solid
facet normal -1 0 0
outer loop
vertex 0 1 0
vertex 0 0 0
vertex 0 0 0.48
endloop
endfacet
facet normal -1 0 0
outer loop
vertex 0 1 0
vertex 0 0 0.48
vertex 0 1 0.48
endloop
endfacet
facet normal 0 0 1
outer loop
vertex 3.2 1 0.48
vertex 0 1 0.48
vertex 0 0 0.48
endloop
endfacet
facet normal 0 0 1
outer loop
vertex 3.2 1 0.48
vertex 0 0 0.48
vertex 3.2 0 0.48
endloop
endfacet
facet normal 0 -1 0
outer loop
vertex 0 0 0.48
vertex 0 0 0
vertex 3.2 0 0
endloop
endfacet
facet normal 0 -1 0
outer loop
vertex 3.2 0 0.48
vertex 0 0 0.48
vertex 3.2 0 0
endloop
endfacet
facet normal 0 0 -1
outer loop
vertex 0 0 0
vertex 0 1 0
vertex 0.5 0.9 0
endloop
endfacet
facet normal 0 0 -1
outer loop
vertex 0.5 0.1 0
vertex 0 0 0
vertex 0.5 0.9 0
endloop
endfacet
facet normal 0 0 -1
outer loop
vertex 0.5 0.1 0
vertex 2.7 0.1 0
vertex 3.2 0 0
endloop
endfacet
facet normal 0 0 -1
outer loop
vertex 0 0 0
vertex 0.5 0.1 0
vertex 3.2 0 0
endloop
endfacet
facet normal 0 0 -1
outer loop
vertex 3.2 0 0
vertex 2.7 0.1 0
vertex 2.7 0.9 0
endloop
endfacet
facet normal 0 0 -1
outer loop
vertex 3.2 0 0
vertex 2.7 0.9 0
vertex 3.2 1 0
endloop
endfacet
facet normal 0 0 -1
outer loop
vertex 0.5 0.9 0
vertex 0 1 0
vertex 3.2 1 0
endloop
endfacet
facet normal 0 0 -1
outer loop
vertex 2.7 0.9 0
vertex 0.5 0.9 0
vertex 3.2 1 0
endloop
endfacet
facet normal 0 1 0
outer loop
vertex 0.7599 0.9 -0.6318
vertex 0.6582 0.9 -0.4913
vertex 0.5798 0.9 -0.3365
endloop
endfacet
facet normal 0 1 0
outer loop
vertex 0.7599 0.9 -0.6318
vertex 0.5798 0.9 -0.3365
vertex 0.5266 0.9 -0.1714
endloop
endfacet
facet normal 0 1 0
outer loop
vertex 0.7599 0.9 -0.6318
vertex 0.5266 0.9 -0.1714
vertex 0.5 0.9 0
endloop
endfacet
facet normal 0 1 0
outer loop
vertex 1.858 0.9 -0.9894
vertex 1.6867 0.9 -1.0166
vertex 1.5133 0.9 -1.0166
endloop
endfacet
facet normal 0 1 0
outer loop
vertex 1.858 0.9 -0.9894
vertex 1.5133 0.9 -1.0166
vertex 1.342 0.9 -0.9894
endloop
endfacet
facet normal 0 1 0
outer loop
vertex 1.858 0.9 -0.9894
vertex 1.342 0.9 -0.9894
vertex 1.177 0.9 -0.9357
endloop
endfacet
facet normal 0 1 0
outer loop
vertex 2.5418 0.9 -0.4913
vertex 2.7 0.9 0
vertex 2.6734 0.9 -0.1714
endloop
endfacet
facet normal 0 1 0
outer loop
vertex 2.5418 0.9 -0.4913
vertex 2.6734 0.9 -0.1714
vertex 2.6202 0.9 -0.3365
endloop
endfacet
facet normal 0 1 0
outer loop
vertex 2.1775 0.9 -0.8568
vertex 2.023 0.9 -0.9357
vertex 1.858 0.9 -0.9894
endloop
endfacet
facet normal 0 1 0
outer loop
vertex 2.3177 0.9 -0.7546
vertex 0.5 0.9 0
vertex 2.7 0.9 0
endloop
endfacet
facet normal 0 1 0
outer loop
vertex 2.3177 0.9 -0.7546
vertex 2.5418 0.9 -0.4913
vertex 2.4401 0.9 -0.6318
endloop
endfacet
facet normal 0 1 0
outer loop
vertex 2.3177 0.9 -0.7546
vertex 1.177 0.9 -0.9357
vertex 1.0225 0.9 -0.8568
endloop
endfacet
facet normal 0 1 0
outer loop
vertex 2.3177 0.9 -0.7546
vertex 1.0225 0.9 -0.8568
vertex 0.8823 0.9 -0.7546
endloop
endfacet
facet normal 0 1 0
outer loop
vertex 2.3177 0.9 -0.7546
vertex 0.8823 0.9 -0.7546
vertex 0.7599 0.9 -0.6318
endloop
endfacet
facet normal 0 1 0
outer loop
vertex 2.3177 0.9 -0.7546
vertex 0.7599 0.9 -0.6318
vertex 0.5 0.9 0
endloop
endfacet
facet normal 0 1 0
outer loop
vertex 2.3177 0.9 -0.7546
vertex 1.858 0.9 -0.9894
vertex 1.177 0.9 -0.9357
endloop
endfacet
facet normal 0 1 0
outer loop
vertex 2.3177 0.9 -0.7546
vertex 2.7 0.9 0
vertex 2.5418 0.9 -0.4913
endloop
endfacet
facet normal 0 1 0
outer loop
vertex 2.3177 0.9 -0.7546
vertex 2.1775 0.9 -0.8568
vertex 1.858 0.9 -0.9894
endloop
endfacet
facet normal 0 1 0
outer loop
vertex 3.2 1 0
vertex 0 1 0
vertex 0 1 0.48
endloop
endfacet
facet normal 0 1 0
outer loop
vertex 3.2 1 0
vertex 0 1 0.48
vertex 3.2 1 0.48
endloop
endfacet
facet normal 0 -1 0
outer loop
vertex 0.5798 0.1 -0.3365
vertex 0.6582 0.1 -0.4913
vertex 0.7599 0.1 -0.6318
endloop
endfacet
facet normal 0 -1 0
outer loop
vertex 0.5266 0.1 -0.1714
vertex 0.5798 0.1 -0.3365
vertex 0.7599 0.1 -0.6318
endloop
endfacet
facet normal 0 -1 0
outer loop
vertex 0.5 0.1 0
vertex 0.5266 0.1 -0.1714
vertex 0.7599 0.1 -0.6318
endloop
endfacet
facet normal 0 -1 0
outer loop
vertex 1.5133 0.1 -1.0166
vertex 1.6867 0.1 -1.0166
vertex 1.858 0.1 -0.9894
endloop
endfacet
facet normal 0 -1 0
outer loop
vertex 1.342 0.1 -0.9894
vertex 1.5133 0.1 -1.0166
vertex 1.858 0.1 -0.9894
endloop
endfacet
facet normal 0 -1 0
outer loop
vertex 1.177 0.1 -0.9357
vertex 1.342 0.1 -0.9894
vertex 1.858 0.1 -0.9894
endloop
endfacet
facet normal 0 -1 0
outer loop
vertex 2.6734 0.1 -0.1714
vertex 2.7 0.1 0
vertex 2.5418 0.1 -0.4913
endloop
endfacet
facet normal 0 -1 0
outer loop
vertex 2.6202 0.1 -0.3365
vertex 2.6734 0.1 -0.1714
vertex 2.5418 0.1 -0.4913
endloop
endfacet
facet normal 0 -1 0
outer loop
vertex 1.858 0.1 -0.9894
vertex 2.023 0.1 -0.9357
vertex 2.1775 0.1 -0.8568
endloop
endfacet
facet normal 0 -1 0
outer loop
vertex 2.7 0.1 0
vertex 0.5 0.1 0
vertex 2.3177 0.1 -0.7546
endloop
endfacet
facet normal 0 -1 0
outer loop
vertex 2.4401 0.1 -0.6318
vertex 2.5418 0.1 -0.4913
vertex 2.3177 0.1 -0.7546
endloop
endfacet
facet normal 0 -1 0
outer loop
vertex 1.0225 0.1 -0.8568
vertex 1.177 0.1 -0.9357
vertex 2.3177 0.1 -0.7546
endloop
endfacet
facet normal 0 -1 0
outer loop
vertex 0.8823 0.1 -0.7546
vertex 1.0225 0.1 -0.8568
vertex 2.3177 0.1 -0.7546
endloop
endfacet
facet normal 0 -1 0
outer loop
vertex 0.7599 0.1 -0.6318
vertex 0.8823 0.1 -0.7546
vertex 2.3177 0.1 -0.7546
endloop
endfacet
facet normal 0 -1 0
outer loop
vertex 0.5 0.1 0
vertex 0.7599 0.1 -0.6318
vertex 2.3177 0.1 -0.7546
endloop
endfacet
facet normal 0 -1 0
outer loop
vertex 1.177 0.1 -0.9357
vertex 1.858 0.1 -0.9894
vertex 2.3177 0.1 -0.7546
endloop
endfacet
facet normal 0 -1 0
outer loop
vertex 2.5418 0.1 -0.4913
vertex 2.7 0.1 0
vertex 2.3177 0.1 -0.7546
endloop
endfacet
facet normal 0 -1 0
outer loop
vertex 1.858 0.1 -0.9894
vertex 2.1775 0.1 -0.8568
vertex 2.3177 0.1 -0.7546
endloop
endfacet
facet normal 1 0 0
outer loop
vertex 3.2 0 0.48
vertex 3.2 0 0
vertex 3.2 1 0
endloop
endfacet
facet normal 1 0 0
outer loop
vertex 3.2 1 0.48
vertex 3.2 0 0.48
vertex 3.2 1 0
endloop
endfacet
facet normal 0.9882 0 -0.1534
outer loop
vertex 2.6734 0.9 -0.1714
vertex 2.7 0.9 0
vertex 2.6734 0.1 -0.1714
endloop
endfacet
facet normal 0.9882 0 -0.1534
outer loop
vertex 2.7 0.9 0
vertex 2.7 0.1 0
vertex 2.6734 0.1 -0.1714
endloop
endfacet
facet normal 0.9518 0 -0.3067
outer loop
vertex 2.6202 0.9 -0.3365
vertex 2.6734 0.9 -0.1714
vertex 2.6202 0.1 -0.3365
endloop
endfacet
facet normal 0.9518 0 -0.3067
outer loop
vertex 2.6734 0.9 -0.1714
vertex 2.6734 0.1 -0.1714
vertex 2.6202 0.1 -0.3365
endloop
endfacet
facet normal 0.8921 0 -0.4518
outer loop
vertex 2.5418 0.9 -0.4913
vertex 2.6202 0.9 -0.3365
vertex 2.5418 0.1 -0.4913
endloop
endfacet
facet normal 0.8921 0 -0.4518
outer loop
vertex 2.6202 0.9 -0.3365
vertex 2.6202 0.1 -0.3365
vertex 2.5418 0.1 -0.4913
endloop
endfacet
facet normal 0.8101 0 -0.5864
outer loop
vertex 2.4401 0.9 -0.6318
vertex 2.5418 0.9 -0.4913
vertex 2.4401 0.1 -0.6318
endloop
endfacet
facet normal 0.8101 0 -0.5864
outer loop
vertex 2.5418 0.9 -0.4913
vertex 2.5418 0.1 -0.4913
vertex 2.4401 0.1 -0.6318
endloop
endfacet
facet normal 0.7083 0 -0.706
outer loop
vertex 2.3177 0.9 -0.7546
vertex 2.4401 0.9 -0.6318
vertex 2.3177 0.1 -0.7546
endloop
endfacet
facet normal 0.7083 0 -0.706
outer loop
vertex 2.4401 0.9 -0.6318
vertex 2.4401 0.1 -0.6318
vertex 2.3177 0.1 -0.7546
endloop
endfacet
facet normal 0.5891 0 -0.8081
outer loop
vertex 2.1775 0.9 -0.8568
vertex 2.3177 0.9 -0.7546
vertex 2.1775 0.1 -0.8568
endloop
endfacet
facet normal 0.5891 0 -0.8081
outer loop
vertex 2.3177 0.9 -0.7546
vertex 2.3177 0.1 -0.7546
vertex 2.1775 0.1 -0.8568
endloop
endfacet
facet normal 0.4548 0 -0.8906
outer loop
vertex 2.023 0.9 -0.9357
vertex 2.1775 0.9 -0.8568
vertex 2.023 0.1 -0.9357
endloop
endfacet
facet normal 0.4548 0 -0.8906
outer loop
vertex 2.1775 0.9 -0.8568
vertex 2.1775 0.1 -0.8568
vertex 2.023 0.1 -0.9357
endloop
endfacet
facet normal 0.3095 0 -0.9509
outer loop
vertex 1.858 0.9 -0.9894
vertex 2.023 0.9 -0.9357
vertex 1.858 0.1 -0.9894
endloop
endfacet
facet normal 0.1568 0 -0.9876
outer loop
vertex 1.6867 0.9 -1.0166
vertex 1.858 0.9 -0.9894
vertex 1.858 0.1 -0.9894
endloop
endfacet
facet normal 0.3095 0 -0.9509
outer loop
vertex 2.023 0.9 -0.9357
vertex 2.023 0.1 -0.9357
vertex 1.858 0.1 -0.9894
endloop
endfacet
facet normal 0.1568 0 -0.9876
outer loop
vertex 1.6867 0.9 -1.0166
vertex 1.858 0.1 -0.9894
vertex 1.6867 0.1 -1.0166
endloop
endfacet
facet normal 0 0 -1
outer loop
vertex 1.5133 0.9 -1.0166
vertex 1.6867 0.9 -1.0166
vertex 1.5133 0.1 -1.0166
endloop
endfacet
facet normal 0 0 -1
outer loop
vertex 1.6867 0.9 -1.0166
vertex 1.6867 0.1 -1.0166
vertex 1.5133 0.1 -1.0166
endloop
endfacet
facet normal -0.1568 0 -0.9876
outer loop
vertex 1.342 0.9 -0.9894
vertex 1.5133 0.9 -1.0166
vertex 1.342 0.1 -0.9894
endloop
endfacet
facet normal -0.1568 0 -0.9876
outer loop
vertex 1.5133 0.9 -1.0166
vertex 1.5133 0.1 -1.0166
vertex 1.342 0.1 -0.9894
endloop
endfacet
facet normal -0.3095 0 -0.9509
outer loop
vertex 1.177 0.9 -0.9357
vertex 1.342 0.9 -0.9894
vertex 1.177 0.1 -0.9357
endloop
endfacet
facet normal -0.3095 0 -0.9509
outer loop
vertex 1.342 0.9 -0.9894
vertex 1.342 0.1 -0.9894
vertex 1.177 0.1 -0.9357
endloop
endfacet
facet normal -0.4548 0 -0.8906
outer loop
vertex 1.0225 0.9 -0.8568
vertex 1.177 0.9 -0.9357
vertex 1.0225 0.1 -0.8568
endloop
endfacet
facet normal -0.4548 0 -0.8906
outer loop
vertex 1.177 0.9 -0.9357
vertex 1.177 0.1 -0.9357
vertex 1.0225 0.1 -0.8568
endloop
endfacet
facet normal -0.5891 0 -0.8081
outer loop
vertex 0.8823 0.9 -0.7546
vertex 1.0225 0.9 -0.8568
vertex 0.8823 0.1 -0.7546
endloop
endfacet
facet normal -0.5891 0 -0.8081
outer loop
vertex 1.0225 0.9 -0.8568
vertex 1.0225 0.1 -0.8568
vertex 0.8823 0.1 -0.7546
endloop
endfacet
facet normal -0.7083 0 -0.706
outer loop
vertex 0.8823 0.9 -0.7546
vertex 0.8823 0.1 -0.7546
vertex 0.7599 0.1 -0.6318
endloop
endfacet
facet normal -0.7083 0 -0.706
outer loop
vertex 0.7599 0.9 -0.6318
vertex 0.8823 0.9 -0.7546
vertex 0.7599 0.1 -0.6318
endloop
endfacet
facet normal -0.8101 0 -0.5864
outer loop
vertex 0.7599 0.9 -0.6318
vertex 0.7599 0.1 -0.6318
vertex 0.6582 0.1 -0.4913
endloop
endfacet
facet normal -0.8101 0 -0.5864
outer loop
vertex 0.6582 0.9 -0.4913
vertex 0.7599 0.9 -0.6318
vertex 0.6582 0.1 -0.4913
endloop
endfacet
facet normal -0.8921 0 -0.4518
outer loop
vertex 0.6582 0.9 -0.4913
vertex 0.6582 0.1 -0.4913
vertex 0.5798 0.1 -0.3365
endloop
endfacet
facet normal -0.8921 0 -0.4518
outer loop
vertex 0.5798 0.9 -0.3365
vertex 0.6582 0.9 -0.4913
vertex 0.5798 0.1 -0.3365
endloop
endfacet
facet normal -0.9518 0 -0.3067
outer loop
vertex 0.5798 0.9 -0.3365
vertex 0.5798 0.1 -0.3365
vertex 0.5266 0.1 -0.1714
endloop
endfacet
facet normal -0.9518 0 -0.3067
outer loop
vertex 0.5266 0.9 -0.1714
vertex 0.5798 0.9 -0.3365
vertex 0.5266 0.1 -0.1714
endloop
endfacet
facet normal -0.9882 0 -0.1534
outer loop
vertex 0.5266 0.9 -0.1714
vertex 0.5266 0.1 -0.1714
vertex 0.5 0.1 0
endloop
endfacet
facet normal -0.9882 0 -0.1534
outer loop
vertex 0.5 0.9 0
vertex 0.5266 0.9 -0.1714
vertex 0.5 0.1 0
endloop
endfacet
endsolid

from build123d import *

# Parameters (mm, degrees)
SKETCH_1_W      = 3.2
SKETCH_1_H      = 1
EXTRUDE_1_DEPTH = 0.48
EXTRUDE_2_DEPTH = 0.4


with BuildPart() as part:
    # 草图1 → 凸台-拉伸1 (new body)
    with BuildSketch(Plane.XY):
        with Locations((1.6, 0.5)):
            Rectangle(SKETCH_1_W, SKETCH_1_H)
    extrude(amount=EXTRUDE_1_DEPTH)

    # 草图2 → 凸台-拉伸2 (add, symmetric)
    with BuildSketch(Plane(origin=(0, 0.5, 0), x_dir=(-1, 0, 0), z_dir=(0, -1, 0))):
        with BuildLine():
            Line((-0.5, 0), (-2.7, 0))
            ThreePointArc((-2.7, 0), (-1.6, 1.02), (-0.5, 0))
        make_face()
    extrude(amount=EXTRUDE_2_DEPTH, both=True)


solid = part.part
